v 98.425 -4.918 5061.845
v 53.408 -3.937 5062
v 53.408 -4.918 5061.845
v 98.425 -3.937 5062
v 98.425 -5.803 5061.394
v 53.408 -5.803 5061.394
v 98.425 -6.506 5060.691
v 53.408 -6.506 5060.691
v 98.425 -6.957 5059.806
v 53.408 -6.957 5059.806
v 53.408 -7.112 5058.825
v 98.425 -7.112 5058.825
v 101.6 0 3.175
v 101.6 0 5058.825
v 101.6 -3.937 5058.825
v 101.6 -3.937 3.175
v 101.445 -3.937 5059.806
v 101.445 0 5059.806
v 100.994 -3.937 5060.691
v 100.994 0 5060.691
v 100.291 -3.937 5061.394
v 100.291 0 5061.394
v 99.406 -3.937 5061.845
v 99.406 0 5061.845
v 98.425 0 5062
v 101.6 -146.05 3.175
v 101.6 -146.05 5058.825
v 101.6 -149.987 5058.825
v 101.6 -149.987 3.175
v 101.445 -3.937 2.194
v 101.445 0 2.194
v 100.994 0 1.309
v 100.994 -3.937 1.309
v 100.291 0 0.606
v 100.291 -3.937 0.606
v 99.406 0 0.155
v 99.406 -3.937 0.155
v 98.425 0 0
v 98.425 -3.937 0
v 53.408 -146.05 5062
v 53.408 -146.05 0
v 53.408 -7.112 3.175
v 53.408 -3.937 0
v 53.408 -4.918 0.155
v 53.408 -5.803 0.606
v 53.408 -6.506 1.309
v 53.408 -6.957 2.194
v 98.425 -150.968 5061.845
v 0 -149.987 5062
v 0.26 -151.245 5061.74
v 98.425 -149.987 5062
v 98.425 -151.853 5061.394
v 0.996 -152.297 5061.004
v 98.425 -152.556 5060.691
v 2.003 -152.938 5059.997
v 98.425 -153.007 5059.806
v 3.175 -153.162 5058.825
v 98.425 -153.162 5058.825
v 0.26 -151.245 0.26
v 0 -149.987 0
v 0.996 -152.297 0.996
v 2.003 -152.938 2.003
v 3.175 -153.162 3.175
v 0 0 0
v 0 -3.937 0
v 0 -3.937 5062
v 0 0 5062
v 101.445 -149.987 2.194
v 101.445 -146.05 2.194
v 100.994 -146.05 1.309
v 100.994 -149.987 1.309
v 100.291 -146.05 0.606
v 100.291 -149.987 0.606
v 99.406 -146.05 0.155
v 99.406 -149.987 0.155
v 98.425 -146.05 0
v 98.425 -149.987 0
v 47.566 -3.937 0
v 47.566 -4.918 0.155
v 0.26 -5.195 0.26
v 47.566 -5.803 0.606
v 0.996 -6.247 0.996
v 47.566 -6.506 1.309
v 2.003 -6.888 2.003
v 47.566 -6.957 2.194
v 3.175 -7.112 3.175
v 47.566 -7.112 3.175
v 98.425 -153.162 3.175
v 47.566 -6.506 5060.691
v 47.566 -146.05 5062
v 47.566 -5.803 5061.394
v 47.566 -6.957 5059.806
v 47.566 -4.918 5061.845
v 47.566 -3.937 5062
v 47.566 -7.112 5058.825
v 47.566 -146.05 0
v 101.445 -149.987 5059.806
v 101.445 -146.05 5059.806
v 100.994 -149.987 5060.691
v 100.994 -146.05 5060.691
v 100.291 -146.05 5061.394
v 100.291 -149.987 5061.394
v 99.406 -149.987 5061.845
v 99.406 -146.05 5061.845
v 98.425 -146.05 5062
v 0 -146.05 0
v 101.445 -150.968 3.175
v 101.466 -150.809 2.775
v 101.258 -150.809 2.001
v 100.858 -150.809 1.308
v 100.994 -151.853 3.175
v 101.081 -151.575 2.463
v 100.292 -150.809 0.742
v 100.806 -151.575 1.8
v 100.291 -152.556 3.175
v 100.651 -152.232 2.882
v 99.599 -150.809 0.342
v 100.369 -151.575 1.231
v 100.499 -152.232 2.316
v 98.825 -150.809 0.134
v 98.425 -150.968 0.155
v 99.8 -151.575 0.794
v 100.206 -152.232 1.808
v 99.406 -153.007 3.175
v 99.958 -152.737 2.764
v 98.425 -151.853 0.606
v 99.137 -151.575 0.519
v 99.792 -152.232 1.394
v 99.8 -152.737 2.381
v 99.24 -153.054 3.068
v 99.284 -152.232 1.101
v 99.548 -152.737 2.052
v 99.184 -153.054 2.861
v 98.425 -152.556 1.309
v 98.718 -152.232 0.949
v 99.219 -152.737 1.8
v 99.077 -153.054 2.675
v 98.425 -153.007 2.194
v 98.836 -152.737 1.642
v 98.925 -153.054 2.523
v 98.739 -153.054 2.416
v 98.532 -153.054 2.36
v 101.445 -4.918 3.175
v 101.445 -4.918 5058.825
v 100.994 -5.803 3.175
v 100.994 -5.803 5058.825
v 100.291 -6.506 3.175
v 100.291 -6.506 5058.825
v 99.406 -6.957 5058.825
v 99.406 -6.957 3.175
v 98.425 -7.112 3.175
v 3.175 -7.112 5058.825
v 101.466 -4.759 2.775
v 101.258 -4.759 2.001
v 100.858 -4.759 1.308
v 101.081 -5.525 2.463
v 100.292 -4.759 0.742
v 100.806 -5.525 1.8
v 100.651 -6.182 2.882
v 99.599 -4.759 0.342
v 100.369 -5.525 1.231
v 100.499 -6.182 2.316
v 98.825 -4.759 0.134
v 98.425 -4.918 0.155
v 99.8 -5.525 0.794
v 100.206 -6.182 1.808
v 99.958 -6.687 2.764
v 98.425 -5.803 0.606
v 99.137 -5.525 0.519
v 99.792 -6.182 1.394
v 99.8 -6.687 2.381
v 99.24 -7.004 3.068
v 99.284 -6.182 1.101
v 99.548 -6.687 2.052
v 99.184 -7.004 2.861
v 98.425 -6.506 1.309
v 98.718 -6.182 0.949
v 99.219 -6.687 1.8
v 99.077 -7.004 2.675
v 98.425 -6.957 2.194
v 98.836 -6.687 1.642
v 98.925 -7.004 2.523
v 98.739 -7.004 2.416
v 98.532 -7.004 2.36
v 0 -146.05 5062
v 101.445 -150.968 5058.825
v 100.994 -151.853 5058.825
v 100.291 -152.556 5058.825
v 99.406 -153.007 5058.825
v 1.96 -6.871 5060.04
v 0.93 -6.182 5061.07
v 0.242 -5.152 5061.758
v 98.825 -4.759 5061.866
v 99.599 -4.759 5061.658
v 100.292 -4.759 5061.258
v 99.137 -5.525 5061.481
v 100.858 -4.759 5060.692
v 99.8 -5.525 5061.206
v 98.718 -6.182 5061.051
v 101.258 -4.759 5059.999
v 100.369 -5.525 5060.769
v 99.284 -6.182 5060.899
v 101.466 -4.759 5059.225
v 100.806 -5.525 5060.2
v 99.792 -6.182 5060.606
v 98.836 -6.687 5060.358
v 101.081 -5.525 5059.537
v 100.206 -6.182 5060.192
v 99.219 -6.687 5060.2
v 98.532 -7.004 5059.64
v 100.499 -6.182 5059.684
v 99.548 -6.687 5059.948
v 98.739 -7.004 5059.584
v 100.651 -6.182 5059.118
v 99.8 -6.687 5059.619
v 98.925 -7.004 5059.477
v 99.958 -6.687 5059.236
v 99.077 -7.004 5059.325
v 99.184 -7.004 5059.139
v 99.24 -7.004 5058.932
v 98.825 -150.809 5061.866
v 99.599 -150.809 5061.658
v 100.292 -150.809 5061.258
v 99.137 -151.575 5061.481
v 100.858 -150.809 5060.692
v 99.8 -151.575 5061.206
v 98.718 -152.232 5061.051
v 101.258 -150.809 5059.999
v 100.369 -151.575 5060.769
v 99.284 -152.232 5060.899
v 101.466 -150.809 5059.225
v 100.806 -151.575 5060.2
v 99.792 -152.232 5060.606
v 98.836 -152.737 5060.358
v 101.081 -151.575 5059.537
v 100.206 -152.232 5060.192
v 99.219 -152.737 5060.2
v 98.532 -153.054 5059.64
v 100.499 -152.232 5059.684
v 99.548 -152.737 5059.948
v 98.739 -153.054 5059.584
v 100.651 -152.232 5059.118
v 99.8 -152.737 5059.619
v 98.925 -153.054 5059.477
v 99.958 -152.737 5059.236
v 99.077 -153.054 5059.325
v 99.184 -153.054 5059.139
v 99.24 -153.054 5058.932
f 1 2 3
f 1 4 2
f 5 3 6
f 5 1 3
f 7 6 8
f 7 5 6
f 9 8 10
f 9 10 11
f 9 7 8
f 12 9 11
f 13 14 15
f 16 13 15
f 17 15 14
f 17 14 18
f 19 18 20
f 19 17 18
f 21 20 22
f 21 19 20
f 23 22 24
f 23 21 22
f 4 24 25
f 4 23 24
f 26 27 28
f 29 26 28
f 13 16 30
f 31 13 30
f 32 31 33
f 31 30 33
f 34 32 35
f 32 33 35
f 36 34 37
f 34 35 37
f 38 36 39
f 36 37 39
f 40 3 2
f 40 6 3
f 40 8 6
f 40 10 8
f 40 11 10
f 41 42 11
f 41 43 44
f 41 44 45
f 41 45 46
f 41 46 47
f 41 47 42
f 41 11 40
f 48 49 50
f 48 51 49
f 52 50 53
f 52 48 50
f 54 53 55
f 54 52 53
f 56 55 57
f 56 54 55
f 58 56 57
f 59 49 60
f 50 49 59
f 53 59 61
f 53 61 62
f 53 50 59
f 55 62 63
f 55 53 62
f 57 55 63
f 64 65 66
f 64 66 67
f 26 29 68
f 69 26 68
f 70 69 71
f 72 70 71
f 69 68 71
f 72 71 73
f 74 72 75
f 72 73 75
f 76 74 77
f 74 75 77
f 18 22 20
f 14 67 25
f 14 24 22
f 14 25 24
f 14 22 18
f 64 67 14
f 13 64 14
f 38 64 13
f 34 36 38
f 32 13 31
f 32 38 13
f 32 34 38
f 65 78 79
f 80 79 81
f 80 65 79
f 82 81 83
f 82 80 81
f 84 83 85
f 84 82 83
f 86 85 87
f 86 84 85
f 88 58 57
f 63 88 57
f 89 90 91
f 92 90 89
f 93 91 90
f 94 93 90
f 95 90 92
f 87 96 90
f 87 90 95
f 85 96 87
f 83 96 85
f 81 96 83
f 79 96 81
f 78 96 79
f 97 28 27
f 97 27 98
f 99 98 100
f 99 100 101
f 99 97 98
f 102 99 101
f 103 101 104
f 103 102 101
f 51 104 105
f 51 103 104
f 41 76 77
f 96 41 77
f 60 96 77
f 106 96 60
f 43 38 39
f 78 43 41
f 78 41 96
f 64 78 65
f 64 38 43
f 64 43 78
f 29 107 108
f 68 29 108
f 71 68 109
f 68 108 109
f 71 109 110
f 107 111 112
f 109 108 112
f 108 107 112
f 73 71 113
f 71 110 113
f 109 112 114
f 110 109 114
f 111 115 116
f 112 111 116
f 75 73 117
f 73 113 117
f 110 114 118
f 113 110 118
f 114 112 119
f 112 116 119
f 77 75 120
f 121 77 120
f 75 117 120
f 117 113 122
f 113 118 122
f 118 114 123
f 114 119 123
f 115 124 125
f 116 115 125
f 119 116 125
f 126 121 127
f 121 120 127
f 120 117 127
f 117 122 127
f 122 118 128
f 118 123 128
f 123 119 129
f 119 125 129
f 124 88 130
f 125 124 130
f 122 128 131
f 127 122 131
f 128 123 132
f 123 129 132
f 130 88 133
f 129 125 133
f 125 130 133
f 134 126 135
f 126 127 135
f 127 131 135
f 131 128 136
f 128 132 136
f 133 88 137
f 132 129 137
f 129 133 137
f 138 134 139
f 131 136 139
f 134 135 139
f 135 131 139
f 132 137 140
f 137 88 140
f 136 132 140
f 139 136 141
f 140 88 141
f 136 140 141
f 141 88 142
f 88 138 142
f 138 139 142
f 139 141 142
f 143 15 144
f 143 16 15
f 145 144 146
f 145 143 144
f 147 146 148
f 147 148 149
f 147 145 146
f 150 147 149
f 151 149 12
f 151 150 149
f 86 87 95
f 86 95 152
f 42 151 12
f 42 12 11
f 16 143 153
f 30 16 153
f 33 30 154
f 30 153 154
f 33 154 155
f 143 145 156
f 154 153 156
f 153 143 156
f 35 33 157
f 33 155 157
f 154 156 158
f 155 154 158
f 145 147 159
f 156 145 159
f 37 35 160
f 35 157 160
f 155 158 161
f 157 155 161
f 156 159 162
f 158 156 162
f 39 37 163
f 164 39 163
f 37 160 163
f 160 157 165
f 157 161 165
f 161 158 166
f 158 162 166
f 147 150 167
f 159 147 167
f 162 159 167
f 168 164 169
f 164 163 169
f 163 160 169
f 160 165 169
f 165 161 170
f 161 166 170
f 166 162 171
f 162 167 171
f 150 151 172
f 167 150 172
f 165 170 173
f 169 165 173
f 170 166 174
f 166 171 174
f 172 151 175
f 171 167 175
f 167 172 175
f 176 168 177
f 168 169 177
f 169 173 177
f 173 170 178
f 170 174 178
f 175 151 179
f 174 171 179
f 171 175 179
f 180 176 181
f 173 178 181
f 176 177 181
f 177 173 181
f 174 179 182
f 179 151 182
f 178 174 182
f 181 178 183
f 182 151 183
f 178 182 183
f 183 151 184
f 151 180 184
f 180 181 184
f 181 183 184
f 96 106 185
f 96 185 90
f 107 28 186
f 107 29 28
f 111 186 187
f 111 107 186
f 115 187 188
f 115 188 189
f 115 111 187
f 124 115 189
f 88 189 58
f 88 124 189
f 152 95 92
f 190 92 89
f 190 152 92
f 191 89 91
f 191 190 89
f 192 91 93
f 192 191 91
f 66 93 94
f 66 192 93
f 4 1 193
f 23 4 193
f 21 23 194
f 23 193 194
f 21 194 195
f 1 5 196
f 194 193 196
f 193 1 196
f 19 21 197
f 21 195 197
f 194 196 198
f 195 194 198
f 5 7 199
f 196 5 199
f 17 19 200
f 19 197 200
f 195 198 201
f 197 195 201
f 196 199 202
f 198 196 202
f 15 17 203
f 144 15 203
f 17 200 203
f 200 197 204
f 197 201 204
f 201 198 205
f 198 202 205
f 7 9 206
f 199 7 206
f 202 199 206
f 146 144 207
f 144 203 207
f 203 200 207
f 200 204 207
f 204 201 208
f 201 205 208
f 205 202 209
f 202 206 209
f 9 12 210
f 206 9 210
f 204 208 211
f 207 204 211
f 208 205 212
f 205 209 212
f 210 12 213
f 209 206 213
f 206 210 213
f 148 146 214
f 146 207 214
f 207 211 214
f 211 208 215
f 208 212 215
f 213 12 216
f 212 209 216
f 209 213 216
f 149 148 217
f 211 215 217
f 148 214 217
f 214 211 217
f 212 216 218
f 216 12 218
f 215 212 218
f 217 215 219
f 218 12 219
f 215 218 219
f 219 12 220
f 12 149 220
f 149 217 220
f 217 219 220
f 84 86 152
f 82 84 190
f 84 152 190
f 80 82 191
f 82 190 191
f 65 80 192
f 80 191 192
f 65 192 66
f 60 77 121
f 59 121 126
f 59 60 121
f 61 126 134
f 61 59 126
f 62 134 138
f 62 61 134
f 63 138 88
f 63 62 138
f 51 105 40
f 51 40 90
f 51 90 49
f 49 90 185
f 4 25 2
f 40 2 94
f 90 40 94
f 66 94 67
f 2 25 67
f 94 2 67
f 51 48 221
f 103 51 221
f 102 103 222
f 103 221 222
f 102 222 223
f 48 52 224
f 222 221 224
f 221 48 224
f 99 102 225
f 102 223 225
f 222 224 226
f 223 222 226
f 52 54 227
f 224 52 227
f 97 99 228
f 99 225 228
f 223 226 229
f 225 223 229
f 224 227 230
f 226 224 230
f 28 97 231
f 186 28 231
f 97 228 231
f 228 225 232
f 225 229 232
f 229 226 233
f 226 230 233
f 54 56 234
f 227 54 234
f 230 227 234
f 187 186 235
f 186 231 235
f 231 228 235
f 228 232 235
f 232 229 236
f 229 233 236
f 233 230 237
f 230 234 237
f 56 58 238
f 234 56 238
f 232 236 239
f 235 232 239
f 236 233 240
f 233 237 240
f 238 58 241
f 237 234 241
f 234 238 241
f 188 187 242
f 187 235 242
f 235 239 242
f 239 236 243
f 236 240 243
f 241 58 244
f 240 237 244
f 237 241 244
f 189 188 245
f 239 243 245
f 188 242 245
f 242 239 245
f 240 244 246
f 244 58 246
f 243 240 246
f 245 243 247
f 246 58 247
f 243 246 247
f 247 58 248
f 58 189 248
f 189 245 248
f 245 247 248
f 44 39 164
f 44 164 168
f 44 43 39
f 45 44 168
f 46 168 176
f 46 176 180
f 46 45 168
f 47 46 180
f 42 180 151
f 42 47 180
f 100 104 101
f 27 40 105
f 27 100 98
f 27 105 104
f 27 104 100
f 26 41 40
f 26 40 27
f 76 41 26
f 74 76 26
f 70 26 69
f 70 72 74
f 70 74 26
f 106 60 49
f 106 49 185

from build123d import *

# Parameters (mm, degrees)
BOSS_EXTRUDE1_DEPTH = 5062
FILLET1_R           = 3.175
FILLET2_R           = 3.175
FILLET3_R           = 3.175


with BuildPart() as part:
    # Sketch1 → Boss-Extrude1 (new body)
    with BuildSketch(Plane.XY):
        Polygon((0, -0.000240533), (101.6, -0.000240533), (101.6, -7.112240533), (53.408035714, -7.112240533), (53.408035714, -146.050240533), (101.6, -146.050240533), (101.6, -153.162240533), (0, -153.162240533), (0, -146.050240533), (47.566035714, -146.050240533), (47.566035714, -7.112240533), (0, -7.112240533), align=None)
    extrude(amount=BOSS_EXTRUDE1_DEPTH)

    # Fillet1
    fillet1_edges = [part.edges().sort_by_distance(p)[0] for p in [
        (101.6, -3.556240533, 0),
        (101.6, -149.606240533, 0),
        (101.6, -149.606240533, 5062),
        (101.6, -3.556240533, 5062),
    ]]
    fillet(fillet1_edges, radius=FILLET1_R)

    # Fillet2
    fillet2_edges = [part.edges().sort_by_distance(p)[0] for p in [
        (49.2125, -153.162240533, 0),
        (49.2125, -153.162240533, 5062),
        (0, -153.162240533, 2531),
        (101.6, -153.162240533, 2531),
        (101.6, -153.162240533, 2531),
        (101.6, -153.162240533, 2531),
        (0, -153.162240533, 2531),
        (0, -153.162240533, 2531),
        (101.6, -153.162240533, 2531),
        (100.67006403, -153.162240533, 5061.07006403),
        (100.67006403, -153.162240533, 0.92993597),
    ]]
    fillet(fillet2_edges, radius=FILLET2_R)

    # Fillet3
    fillet3_edges = [part.edges().sort_by_distance(p)[0] for p in [
        (75.916517857, -7.112240533, 0),
        (23.783017857, -7.112240533, 0),
        (0, -7.112240533, 2531),
        (75.916517857, -7.112240533, 5062),
        (101.6, -7.112240533, 2531),
        (100.67006403, -7.112240533, 0.92993597),
        (100.67006403, -7.112240533, 5061.07006403),
        (23.783017857, -7.112240533, 5062),
    ]]
    fillet(fillet3_edges, radius=FILLET3_R)


solid = part.part
